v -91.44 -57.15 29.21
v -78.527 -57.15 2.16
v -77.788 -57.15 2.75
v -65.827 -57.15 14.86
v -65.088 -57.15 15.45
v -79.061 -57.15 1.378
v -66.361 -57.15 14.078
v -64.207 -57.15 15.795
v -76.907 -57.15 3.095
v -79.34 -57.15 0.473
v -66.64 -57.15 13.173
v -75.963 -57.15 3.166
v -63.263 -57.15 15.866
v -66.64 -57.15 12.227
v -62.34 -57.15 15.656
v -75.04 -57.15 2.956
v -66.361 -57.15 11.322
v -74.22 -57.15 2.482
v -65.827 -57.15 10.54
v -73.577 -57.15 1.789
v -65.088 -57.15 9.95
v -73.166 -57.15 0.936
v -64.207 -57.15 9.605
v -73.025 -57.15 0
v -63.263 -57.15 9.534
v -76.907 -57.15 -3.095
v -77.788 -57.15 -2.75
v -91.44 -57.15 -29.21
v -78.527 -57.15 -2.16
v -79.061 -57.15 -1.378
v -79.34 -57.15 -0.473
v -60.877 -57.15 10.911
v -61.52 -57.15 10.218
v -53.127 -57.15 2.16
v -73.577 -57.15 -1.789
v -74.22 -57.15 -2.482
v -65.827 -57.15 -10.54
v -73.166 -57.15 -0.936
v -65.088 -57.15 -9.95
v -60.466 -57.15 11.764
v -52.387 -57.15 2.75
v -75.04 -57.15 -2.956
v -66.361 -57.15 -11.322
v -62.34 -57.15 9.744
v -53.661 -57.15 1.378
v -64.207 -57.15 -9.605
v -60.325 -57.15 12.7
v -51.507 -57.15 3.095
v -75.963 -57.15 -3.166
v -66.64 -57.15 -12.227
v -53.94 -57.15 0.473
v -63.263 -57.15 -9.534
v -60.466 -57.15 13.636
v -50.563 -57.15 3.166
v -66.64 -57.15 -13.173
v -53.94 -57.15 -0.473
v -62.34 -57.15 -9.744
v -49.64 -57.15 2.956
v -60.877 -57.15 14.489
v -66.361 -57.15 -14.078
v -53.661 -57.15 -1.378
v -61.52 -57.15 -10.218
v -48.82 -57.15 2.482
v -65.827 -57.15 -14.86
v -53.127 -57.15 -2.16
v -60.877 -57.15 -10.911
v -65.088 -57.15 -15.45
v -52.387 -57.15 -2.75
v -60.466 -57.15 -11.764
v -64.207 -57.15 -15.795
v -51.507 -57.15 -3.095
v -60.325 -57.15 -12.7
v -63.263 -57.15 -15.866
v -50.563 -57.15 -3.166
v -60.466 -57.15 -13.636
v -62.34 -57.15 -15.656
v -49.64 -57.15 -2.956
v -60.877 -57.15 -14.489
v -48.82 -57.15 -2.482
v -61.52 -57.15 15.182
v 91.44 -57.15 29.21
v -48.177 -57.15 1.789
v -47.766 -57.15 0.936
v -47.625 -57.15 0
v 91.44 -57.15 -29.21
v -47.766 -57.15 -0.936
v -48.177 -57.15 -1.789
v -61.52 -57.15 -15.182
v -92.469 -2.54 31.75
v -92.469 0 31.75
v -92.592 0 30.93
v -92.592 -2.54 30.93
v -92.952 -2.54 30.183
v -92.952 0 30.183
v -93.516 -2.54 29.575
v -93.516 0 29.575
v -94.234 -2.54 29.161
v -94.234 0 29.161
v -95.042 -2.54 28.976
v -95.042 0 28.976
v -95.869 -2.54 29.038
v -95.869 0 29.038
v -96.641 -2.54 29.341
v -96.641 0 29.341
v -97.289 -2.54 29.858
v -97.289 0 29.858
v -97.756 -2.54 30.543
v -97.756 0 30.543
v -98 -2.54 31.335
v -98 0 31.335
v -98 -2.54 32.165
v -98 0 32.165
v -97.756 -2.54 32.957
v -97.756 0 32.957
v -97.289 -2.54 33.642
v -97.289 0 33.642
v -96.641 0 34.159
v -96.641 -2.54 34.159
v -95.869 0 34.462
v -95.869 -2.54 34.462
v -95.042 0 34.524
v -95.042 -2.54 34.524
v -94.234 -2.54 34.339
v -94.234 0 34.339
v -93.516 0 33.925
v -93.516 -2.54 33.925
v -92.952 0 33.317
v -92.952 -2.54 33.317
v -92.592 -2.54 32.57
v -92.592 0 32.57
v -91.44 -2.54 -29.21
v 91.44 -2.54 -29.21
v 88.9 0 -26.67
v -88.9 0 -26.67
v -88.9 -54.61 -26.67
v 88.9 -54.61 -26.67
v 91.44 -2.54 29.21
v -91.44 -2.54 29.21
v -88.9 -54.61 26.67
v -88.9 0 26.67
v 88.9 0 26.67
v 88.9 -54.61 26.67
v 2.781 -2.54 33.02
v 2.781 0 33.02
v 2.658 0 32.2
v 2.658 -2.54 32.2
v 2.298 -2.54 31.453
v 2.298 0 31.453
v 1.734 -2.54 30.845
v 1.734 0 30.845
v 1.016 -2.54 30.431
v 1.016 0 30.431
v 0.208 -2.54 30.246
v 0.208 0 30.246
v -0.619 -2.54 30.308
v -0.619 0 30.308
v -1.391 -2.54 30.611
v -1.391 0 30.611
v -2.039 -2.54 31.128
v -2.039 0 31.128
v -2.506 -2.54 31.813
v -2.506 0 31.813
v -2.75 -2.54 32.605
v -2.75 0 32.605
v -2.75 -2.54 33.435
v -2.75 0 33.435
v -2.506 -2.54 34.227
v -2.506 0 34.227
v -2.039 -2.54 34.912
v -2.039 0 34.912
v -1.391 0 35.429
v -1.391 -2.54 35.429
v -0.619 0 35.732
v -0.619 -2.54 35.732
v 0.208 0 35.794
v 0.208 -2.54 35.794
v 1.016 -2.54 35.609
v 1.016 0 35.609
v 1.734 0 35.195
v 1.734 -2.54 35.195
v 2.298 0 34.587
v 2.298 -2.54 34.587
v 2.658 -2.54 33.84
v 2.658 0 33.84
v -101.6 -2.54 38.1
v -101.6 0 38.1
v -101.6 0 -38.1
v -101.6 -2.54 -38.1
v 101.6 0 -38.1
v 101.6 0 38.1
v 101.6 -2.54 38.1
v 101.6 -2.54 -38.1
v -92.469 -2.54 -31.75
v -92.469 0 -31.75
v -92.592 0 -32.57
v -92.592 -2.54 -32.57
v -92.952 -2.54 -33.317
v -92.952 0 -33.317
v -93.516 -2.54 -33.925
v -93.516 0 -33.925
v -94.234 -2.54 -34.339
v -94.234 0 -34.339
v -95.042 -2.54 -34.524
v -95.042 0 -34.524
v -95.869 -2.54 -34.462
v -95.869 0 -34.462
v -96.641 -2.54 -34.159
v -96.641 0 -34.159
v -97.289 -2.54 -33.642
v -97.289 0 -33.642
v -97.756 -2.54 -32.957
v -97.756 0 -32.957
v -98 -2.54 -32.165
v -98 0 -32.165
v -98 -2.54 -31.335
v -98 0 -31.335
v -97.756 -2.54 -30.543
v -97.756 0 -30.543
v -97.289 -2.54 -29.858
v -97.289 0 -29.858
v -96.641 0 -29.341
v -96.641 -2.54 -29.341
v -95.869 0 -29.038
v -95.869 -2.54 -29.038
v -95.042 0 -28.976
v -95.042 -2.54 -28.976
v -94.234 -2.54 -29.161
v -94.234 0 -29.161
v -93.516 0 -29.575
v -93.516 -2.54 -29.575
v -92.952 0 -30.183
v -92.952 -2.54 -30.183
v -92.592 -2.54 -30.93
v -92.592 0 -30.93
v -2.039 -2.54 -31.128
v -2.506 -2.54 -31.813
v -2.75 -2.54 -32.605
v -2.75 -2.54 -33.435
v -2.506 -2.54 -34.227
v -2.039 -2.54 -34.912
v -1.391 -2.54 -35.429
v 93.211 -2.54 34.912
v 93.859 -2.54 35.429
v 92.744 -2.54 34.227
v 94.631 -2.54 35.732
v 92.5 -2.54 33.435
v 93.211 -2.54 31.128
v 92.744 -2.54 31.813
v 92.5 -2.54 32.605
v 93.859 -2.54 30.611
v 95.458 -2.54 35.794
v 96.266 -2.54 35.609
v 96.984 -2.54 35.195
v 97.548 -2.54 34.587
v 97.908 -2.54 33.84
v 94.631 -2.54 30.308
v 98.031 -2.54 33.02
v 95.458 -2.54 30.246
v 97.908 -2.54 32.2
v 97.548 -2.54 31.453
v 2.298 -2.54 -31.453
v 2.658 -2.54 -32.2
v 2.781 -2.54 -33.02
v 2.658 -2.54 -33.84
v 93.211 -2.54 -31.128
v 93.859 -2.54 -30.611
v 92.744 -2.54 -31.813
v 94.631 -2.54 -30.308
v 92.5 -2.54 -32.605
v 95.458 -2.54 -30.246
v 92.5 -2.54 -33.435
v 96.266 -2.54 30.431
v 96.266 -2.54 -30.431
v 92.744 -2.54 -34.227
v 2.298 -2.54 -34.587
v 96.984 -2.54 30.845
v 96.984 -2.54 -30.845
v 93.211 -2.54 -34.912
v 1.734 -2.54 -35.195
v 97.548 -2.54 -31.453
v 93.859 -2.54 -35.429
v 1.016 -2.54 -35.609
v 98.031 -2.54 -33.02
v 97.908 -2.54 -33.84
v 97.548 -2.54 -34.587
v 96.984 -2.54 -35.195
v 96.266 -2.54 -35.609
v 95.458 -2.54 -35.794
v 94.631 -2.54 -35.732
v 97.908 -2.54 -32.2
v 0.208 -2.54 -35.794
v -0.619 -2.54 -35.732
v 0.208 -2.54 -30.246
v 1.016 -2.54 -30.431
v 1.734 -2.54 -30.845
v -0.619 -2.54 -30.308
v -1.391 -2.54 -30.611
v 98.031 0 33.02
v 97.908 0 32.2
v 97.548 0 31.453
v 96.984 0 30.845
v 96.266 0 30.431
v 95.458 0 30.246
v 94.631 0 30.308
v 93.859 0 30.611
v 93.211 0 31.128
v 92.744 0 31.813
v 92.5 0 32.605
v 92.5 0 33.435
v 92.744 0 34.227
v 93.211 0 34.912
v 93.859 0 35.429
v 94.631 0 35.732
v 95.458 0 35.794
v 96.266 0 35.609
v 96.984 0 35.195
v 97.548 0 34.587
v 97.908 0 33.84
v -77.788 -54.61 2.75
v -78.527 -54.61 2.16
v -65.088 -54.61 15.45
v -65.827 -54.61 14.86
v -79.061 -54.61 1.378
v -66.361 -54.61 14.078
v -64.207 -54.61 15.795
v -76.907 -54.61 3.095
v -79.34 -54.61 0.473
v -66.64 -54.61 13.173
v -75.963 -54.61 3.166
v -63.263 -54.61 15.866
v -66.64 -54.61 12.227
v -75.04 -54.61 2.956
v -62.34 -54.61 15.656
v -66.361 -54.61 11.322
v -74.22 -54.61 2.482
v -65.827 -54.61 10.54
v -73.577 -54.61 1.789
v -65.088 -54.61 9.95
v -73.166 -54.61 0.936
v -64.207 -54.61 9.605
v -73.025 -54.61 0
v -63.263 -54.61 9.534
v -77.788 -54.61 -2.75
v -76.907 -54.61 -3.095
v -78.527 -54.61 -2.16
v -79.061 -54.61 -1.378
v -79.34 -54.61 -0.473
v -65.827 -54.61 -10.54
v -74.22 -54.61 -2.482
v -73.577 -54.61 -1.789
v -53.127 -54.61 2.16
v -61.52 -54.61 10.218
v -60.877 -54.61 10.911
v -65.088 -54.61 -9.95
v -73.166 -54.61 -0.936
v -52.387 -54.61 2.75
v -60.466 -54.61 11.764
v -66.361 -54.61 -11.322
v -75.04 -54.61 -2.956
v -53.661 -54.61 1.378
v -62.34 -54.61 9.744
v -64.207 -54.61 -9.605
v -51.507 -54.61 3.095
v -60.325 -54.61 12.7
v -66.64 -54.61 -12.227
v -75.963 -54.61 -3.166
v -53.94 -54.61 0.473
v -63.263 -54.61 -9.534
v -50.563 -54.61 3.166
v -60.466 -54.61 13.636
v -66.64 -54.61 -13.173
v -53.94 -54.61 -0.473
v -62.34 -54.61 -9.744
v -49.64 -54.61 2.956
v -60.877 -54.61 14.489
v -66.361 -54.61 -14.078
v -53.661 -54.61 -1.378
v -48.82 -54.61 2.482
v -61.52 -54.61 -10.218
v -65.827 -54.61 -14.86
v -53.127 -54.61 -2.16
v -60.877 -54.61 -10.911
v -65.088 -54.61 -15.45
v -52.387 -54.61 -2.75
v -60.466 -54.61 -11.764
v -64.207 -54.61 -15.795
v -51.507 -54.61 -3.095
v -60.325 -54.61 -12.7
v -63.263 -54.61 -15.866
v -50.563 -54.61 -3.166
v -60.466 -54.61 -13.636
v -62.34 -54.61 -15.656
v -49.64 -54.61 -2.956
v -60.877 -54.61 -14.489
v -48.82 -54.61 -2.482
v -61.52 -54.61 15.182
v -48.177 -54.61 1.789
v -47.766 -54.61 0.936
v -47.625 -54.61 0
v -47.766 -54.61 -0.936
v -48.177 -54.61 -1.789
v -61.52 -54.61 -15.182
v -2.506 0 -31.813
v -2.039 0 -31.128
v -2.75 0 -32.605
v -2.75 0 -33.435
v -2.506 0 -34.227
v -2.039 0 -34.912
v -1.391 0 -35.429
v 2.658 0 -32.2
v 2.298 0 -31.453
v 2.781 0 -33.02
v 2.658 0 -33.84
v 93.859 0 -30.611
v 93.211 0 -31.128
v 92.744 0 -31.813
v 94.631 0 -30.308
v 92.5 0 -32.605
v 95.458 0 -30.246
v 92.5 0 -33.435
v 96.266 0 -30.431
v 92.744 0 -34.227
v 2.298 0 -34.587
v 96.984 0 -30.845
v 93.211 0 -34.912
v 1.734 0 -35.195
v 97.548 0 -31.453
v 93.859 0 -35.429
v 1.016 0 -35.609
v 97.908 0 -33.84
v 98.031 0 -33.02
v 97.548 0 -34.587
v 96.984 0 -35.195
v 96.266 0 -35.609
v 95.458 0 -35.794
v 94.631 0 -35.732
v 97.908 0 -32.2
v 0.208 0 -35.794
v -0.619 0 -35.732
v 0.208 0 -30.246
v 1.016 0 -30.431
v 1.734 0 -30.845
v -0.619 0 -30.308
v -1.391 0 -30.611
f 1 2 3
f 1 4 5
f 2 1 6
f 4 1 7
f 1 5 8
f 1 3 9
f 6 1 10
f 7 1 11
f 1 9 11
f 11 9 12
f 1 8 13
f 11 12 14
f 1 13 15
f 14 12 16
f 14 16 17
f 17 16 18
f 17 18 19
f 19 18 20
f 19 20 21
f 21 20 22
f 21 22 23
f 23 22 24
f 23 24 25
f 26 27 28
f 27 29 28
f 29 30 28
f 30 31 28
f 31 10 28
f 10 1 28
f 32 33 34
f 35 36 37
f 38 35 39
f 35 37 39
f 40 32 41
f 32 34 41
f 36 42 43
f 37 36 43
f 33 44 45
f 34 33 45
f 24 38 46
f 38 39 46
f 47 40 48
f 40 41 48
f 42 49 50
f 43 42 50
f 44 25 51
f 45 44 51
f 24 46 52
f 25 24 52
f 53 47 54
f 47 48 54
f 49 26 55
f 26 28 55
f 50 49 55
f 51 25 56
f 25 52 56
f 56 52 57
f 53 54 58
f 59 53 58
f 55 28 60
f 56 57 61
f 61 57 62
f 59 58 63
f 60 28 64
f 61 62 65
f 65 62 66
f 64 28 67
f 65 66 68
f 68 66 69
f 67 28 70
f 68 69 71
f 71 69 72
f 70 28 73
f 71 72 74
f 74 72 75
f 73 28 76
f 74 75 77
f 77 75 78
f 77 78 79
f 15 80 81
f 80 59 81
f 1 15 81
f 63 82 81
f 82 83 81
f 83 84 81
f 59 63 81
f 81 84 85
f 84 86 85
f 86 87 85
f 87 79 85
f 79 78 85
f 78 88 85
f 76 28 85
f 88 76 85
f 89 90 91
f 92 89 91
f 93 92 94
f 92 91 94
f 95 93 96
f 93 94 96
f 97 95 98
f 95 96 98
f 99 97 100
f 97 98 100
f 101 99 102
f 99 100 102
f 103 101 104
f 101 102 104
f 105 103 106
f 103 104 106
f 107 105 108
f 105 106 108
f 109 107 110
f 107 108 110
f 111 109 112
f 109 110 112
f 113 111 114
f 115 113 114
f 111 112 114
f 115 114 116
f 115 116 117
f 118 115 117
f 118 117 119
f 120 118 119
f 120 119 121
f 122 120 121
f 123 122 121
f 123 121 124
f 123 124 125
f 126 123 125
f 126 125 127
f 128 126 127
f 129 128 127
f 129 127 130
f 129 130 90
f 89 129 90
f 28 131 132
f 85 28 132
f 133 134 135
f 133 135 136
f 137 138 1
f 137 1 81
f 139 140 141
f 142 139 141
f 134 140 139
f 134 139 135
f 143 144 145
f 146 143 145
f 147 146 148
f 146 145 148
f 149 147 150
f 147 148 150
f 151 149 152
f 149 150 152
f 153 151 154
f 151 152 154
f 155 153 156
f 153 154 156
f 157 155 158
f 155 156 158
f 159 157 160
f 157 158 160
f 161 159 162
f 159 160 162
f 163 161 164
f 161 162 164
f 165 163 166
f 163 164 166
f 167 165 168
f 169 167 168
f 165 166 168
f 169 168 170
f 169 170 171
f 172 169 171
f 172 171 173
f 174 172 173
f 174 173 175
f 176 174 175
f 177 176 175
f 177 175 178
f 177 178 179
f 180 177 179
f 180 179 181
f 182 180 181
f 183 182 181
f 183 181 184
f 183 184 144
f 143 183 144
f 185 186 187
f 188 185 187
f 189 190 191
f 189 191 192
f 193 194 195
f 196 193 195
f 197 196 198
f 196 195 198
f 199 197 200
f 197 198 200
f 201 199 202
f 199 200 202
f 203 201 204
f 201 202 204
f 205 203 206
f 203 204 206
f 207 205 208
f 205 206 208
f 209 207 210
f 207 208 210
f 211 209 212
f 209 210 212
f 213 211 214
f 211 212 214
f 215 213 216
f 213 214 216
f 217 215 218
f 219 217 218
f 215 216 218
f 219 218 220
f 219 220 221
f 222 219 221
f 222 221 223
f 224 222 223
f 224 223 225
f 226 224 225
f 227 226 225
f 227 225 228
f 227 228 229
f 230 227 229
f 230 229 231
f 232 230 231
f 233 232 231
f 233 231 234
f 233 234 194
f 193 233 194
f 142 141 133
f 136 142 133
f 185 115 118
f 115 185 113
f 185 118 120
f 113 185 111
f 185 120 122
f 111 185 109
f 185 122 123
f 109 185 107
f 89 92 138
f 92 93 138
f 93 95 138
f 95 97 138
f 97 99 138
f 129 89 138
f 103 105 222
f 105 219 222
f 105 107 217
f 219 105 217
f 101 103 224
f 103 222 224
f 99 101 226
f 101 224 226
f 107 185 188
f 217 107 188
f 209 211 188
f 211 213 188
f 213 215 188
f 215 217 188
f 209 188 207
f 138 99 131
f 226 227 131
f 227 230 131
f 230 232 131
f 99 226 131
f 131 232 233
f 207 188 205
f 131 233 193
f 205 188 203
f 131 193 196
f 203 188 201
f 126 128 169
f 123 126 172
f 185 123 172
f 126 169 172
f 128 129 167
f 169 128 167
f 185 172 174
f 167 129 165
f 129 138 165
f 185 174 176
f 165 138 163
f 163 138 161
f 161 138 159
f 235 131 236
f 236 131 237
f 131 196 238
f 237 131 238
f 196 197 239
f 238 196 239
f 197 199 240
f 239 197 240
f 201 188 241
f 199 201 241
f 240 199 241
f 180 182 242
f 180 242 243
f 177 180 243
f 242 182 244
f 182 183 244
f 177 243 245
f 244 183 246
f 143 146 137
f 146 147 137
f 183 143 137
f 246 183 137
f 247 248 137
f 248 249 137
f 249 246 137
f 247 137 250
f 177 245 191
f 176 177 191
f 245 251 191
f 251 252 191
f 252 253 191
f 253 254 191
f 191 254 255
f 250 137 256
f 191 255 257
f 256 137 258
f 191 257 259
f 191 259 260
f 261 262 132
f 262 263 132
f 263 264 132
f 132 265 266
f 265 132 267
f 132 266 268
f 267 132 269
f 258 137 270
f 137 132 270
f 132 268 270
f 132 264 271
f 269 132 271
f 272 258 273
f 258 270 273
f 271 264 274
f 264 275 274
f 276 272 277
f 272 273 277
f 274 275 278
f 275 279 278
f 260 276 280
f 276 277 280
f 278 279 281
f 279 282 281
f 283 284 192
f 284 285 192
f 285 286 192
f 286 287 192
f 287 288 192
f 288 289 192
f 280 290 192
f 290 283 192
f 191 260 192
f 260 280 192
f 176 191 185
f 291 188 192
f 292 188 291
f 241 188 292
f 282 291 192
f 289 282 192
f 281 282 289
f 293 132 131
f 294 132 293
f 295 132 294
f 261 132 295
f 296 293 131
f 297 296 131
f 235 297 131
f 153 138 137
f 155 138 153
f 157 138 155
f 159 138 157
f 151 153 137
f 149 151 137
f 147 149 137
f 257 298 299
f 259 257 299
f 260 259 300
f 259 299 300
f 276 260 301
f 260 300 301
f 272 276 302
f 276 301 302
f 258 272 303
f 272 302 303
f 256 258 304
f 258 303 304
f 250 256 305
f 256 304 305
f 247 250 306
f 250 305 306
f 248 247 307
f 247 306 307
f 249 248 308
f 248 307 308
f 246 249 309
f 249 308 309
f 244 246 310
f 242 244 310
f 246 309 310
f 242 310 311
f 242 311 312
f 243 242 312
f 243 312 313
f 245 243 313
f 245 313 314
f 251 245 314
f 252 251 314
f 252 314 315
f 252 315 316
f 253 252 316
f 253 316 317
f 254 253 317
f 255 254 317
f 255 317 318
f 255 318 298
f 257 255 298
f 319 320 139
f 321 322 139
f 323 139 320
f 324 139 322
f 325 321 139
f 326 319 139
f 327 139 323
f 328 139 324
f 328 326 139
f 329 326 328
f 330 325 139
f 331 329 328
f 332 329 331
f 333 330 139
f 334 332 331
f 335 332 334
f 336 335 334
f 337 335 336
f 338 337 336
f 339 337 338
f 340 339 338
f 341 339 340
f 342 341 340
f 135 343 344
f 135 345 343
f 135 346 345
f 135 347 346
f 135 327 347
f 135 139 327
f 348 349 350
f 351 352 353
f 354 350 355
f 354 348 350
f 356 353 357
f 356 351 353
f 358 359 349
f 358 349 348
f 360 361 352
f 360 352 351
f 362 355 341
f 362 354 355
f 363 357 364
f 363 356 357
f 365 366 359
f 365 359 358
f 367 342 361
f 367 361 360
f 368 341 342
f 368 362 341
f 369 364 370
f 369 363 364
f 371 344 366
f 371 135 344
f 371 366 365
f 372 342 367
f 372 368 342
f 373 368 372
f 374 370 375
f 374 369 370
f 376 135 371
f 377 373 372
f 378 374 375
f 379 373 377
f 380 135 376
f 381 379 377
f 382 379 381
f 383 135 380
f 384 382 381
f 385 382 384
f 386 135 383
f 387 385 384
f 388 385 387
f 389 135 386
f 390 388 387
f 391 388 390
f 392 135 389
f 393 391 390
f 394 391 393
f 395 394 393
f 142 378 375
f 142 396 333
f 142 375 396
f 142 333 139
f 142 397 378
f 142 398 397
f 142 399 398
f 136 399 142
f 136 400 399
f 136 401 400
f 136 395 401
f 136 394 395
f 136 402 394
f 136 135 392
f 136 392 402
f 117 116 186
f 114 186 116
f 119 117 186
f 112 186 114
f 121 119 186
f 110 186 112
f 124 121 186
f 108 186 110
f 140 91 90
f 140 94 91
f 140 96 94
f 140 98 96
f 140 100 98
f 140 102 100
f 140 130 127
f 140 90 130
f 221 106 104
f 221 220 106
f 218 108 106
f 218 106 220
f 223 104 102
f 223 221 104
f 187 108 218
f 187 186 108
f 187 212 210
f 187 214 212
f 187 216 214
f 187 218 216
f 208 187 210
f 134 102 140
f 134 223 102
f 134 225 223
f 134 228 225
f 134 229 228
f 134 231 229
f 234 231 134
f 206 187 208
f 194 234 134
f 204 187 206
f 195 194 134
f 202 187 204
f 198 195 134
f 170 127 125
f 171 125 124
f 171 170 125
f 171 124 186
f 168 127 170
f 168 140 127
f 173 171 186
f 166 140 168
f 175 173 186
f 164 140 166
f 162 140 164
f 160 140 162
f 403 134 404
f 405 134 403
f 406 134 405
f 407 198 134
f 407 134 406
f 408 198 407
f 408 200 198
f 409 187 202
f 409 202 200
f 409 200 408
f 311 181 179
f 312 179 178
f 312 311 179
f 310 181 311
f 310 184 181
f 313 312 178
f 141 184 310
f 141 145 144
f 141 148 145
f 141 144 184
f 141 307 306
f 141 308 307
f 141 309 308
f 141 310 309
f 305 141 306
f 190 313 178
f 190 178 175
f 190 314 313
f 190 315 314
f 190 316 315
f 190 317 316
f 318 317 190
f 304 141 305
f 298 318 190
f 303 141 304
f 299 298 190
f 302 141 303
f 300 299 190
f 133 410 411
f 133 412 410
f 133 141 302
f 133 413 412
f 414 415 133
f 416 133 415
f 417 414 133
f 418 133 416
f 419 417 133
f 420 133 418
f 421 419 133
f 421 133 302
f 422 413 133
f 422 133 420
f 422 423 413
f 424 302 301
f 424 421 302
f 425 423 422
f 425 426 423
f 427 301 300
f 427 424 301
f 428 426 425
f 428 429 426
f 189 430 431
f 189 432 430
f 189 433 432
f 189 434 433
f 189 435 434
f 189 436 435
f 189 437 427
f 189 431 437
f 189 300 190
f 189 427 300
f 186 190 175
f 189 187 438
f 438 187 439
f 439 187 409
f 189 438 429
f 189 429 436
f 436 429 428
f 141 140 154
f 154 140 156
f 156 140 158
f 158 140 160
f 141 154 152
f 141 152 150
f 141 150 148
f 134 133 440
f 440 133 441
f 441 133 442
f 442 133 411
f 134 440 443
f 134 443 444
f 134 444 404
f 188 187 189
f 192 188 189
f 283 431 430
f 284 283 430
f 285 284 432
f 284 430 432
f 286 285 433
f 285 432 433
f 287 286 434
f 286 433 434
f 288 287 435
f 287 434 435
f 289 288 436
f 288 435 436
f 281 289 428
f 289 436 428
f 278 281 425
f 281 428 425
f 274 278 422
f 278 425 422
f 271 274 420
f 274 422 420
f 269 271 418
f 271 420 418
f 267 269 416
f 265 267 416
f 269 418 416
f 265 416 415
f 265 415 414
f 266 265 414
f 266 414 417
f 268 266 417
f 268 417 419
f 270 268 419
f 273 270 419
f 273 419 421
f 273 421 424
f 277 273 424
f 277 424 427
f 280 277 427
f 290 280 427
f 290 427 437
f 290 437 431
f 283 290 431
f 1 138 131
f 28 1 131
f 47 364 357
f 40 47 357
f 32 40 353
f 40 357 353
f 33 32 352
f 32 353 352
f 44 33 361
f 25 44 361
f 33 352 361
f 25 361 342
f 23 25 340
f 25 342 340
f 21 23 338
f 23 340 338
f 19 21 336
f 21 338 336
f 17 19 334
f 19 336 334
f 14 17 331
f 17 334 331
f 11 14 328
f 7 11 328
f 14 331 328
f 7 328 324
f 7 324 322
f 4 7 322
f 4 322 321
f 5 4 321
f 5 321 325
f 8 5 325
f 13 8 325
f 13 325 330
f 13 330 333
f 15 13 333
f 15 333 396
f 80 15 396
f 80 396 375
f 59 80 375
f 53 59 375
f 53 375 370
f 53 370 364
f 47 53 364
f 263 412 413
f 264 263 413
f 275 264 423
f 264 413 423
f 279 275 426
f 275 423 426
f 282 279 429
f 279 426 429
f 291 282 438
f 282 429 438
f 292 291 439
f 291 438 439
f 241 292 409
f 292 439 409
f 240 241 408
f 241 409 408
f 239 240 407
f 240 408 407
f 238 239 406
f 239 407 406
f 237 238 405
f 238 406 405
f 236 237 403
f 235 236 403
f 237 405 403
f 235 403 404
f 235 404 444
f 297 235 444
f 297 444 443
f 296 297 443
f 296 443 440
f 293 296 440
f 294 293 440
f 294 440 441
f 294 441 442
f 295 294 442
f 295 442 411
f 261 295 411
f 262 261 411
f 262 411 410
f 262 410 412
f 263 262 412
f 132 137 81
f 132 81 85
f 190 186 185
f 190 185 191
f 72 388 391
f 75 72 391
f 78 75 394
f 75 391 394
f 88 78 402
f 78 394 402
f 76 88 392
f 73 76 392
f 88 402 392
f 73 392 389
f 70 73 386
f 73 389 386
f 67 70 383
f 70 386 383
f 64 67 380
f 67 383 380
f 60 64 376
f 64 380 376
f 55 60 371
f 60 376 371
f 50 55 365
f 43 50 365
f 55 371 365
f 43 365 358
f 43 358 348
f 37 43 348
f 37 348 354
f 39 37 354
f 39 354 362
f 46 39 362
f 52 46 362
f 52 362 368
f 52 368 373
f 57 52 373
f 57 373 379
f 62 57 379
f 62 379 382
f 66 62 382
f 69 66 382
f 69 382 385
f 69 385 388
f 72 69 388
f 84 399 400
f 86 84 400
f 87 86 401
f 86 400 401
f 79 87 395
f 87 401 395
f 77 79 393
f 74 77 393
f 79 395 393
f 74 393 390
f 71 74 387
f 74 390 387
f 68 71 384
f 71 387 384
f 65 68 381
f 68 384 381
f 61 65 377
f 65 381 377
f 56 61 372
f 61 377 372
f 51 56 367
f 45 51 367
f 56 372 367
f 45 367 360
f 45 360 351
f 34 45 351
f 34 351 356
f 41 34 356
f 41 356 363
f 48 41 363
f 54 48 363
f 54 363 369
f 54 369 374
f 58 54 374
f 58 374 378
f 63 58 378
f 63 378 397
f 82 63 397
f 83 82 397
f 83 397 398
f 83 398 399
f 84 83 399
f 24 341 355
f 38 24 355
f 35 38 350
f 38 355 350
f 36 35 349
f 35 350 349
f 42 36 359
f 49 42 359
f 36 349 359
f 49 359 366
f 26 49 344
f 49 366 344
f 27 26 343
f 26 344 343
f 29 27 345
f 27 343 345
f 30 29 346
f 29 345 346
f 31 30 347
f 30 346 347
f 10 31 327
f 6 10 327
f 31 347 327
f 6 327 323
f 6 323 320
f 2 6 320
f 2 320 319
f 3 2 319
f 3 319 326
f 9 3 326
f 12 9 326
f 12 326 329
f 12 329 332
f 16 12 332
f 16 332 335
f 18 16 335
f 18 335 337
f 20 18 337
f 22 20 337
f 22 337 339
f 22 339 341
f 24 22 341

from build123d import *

# Parameters (mm, degrees)
SKETCH3_W           = 182.88
SKETCH3_H           = 58.42
BOSS_EXTRUDE1_DEPTH = 57.15
SKETCH4_W           = 203.2
SKETCH4_H           = 76.2
BOSS_EXTRUDE2_DEPTH = 2.54
SKETCH5_W           = 177.8
SKETCH5_H           = 53.34
CUT_EXTRUDE1_DEPTH  = 54.61
SKETCH6_R           = 2.7813
CUT_EXTRUDE2_DEPTH  = 53.34
SKETCH7_R           = 3.175
CUT_EXTRUDE3_DEPTH  = 3.54


with BuildPart() as part:
    # Sketch3 → Boss-Extrude1 (new body)
    with BuildSketch(Plane(origin=(0, 0, 0), x_dir=(1, 0, 0), z_dir=(0, 1, 0))):
        Rectangle(SKETCH3_W, SKETCH3_H)
    extrude(amount=-BOSS_EXTRUDE1_DEPTH)

    # Sketch4 → Boss-Extrude2 (add)
    with BuildSketch(Plane(origin=(0, 0, 0), x_dir=(1, 0, 0), z_dir=(0, 1, 0))):
        Rectangle(SKETCH4_W, SKETCH4_H)
    extrude(amount=-BOSS_EXTRUDE2_DEPTH)

    # Sketch5 → Cut-Extrude1 (cut)
    with BuildSketch(Plane(origin=(0, 0, 0), x_dir=(1, 0, 0), z_dir=(0, 1, 0))):
        Rectangle(SKETCH5_W, SKETCH5_H)
    extrude(amount=-CUT_EXTRUDE1_DEPTH, mode=Mode.SUBTRACT)

    # Sketch6 → Cut-Extrude2 (cut)
    with BuildSketch(Plane(origin=(0, 0, 0), x_dir=(1, 0, 0), z_dir=(0, 1, 0))):
        with Locations((-95.25, 31.75)):
            Circle(SKETCH6_R)
        with Locations((0, 33.02)):
            Circle(SKETCH6_R)
        with Locations((95.25, 33.02)):
            Circle(SKETCH6_R)
        with Locations((95.25, -33.02)):
            Circle(SKETCH6_R)
        with Locations((0, -33.02)):
            Circle(SKETCH6_R)
        with Locations((-95.25, -31.75)):
            Circle(SKETCH6_R)
    extrude(amount=-CUT_EXTRUDE2_DEPTH, mode=Mode.SUBTRACT)

    # Sketch7 → Cut-Extrude3 (cut, through all)
    with BuildSketch(Plane(origin=(0, -54.61, 0), x_dir=(1, 0, 0), z_dir=(0, 1, 0))):
        with Locations((-63.5, 12.7)):
            Circle(SKETCH7_R)
        with Locations((-50.8, 0)):
            Circle(SKETCH7_R)
        with Locations((-63.5, -12.7)):
            Circle(SKETCH7_R)
        with Locations((-76.2, 0)):
            Circle(SKETCH7_R)
    extrude(amount=-CUT_EXTRUDE3_DEPTH, mode=Mode.SUBTRACT)


solid = part.part
